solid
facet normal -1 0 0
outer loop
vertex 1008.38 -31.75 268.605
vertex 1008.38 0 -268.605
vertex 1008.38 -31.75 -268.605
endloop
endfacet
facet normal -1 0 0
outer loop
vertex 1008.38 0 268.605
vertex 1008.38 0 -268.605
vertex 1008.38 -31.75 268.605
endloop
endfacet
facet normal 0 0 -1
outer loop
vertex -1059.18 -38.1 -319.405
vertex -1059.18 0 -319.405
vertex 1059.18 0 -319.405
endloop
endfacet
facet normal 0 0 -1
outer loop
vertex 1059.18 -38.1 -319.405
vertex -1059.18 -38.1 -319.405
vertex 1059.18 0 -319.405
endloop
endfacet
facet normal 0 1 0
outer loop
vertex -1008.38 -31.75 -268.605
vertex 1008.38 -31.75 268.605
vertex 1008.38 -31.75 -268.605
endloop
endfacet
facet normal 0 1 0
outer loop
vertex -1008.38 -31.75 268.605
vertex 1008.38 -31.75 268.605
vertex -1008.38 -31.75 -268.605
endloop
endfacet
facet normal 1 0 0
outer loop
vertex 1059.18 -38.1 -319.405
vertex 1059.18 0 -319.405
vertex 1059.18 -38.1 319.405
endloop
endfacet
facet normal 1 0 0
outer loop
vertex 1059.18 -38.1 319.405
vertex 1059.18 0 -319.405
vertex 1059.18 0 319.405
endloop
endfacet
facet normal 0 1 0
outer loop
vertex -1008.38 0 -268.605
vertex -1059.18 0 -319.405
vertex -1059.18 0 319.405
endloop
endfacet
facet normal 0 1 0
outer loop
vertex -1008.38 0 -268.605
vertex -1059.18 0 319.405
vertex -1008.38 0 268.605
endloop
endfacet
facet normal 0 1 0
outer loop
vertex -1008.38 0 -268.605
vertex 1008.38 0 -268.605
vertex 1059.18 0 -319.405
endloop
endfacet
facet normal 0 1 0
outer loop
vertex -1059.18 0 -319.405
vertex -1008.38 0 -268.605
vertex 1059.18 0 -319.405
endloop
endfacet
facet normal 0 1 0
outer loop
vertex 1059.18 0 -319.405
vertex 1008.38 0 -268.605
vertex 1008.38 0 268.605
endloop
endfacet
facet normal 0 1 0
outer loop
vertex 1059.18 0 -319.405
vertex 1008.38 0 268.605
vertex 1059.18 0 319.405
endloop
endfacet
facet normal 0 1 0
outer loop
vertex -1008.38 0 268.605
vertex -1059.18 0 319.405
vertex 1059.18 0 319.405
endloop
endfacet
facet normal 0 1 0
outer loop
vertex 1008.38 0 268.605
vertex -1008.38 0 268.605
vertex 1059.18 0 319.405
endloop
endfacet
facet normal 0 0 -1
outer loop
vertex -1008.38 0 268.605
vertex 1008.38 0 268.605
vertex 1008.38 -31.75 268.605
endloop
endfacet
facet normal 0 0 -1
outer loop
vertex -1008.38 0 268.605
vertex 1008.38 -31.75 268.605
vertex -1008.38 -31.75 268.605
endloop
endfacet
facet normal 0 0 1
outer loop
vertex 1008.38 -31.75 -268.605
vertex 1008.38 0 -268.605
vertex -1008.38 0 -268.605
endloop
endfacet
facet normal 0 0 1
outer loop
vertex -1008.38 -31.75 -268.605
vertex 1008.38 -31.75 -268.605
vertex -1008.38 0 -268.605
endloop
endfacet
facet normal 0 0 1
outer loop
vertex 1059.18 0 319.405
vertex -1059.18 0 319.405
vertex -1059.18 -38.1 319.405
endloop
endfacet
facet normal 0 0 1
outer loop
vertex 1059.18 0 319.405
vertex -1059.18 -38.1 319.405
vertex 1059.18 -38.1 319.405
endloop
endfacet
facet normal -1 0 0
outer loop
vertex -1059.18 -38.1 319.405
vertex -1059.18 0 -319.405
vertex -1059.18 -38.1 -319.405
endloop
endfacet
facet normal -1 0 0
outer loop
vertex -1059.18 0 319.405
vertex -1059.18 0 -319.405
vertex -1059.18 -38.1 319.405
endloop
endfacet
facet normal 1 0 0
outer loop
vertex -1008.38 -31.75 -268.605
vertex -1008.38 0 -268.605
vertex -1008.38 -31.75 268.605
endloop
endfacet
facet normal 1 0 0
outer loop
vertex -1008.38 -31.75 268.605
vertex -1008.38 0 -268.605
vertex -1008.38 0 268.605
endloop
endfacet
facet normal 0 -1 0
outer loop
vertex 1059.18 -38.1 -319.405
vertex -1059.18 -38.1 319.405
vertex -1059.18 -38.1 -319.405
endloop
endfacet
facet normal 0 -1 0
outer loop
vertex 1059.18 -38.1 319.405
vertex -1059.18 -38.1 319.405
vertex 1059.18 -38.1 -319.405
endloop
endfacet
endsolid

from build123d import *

# Parameters (mm, degrees)
F0_W     = 2118.36
F0_H     = 638.81
F1_DEPTH = 38.1
F2_W     = 2016.76
F2_H     = 537.21
F3_DEPTH = 31.75


with BuildPart() as f1:
    # F0 (on Front) → F1 (new body)
    with BuildSketch(Plane.XZ):
        Rectangle(F0_W, F0_H)
    extrude(amount=F1_DEPTH)

    # F2 (on face) → F3 (cut)
    with BuildSketch(Plane(origin=(0, 0, 0), x_dir=(-1, 0, 0), z_dir=(0, 1, 0))):
        Rectangle(F2_W, F2_H)
    extrude(amount=-F3_DEPTH, mode=Mode.SUBTRACT)


solid = f1.part
